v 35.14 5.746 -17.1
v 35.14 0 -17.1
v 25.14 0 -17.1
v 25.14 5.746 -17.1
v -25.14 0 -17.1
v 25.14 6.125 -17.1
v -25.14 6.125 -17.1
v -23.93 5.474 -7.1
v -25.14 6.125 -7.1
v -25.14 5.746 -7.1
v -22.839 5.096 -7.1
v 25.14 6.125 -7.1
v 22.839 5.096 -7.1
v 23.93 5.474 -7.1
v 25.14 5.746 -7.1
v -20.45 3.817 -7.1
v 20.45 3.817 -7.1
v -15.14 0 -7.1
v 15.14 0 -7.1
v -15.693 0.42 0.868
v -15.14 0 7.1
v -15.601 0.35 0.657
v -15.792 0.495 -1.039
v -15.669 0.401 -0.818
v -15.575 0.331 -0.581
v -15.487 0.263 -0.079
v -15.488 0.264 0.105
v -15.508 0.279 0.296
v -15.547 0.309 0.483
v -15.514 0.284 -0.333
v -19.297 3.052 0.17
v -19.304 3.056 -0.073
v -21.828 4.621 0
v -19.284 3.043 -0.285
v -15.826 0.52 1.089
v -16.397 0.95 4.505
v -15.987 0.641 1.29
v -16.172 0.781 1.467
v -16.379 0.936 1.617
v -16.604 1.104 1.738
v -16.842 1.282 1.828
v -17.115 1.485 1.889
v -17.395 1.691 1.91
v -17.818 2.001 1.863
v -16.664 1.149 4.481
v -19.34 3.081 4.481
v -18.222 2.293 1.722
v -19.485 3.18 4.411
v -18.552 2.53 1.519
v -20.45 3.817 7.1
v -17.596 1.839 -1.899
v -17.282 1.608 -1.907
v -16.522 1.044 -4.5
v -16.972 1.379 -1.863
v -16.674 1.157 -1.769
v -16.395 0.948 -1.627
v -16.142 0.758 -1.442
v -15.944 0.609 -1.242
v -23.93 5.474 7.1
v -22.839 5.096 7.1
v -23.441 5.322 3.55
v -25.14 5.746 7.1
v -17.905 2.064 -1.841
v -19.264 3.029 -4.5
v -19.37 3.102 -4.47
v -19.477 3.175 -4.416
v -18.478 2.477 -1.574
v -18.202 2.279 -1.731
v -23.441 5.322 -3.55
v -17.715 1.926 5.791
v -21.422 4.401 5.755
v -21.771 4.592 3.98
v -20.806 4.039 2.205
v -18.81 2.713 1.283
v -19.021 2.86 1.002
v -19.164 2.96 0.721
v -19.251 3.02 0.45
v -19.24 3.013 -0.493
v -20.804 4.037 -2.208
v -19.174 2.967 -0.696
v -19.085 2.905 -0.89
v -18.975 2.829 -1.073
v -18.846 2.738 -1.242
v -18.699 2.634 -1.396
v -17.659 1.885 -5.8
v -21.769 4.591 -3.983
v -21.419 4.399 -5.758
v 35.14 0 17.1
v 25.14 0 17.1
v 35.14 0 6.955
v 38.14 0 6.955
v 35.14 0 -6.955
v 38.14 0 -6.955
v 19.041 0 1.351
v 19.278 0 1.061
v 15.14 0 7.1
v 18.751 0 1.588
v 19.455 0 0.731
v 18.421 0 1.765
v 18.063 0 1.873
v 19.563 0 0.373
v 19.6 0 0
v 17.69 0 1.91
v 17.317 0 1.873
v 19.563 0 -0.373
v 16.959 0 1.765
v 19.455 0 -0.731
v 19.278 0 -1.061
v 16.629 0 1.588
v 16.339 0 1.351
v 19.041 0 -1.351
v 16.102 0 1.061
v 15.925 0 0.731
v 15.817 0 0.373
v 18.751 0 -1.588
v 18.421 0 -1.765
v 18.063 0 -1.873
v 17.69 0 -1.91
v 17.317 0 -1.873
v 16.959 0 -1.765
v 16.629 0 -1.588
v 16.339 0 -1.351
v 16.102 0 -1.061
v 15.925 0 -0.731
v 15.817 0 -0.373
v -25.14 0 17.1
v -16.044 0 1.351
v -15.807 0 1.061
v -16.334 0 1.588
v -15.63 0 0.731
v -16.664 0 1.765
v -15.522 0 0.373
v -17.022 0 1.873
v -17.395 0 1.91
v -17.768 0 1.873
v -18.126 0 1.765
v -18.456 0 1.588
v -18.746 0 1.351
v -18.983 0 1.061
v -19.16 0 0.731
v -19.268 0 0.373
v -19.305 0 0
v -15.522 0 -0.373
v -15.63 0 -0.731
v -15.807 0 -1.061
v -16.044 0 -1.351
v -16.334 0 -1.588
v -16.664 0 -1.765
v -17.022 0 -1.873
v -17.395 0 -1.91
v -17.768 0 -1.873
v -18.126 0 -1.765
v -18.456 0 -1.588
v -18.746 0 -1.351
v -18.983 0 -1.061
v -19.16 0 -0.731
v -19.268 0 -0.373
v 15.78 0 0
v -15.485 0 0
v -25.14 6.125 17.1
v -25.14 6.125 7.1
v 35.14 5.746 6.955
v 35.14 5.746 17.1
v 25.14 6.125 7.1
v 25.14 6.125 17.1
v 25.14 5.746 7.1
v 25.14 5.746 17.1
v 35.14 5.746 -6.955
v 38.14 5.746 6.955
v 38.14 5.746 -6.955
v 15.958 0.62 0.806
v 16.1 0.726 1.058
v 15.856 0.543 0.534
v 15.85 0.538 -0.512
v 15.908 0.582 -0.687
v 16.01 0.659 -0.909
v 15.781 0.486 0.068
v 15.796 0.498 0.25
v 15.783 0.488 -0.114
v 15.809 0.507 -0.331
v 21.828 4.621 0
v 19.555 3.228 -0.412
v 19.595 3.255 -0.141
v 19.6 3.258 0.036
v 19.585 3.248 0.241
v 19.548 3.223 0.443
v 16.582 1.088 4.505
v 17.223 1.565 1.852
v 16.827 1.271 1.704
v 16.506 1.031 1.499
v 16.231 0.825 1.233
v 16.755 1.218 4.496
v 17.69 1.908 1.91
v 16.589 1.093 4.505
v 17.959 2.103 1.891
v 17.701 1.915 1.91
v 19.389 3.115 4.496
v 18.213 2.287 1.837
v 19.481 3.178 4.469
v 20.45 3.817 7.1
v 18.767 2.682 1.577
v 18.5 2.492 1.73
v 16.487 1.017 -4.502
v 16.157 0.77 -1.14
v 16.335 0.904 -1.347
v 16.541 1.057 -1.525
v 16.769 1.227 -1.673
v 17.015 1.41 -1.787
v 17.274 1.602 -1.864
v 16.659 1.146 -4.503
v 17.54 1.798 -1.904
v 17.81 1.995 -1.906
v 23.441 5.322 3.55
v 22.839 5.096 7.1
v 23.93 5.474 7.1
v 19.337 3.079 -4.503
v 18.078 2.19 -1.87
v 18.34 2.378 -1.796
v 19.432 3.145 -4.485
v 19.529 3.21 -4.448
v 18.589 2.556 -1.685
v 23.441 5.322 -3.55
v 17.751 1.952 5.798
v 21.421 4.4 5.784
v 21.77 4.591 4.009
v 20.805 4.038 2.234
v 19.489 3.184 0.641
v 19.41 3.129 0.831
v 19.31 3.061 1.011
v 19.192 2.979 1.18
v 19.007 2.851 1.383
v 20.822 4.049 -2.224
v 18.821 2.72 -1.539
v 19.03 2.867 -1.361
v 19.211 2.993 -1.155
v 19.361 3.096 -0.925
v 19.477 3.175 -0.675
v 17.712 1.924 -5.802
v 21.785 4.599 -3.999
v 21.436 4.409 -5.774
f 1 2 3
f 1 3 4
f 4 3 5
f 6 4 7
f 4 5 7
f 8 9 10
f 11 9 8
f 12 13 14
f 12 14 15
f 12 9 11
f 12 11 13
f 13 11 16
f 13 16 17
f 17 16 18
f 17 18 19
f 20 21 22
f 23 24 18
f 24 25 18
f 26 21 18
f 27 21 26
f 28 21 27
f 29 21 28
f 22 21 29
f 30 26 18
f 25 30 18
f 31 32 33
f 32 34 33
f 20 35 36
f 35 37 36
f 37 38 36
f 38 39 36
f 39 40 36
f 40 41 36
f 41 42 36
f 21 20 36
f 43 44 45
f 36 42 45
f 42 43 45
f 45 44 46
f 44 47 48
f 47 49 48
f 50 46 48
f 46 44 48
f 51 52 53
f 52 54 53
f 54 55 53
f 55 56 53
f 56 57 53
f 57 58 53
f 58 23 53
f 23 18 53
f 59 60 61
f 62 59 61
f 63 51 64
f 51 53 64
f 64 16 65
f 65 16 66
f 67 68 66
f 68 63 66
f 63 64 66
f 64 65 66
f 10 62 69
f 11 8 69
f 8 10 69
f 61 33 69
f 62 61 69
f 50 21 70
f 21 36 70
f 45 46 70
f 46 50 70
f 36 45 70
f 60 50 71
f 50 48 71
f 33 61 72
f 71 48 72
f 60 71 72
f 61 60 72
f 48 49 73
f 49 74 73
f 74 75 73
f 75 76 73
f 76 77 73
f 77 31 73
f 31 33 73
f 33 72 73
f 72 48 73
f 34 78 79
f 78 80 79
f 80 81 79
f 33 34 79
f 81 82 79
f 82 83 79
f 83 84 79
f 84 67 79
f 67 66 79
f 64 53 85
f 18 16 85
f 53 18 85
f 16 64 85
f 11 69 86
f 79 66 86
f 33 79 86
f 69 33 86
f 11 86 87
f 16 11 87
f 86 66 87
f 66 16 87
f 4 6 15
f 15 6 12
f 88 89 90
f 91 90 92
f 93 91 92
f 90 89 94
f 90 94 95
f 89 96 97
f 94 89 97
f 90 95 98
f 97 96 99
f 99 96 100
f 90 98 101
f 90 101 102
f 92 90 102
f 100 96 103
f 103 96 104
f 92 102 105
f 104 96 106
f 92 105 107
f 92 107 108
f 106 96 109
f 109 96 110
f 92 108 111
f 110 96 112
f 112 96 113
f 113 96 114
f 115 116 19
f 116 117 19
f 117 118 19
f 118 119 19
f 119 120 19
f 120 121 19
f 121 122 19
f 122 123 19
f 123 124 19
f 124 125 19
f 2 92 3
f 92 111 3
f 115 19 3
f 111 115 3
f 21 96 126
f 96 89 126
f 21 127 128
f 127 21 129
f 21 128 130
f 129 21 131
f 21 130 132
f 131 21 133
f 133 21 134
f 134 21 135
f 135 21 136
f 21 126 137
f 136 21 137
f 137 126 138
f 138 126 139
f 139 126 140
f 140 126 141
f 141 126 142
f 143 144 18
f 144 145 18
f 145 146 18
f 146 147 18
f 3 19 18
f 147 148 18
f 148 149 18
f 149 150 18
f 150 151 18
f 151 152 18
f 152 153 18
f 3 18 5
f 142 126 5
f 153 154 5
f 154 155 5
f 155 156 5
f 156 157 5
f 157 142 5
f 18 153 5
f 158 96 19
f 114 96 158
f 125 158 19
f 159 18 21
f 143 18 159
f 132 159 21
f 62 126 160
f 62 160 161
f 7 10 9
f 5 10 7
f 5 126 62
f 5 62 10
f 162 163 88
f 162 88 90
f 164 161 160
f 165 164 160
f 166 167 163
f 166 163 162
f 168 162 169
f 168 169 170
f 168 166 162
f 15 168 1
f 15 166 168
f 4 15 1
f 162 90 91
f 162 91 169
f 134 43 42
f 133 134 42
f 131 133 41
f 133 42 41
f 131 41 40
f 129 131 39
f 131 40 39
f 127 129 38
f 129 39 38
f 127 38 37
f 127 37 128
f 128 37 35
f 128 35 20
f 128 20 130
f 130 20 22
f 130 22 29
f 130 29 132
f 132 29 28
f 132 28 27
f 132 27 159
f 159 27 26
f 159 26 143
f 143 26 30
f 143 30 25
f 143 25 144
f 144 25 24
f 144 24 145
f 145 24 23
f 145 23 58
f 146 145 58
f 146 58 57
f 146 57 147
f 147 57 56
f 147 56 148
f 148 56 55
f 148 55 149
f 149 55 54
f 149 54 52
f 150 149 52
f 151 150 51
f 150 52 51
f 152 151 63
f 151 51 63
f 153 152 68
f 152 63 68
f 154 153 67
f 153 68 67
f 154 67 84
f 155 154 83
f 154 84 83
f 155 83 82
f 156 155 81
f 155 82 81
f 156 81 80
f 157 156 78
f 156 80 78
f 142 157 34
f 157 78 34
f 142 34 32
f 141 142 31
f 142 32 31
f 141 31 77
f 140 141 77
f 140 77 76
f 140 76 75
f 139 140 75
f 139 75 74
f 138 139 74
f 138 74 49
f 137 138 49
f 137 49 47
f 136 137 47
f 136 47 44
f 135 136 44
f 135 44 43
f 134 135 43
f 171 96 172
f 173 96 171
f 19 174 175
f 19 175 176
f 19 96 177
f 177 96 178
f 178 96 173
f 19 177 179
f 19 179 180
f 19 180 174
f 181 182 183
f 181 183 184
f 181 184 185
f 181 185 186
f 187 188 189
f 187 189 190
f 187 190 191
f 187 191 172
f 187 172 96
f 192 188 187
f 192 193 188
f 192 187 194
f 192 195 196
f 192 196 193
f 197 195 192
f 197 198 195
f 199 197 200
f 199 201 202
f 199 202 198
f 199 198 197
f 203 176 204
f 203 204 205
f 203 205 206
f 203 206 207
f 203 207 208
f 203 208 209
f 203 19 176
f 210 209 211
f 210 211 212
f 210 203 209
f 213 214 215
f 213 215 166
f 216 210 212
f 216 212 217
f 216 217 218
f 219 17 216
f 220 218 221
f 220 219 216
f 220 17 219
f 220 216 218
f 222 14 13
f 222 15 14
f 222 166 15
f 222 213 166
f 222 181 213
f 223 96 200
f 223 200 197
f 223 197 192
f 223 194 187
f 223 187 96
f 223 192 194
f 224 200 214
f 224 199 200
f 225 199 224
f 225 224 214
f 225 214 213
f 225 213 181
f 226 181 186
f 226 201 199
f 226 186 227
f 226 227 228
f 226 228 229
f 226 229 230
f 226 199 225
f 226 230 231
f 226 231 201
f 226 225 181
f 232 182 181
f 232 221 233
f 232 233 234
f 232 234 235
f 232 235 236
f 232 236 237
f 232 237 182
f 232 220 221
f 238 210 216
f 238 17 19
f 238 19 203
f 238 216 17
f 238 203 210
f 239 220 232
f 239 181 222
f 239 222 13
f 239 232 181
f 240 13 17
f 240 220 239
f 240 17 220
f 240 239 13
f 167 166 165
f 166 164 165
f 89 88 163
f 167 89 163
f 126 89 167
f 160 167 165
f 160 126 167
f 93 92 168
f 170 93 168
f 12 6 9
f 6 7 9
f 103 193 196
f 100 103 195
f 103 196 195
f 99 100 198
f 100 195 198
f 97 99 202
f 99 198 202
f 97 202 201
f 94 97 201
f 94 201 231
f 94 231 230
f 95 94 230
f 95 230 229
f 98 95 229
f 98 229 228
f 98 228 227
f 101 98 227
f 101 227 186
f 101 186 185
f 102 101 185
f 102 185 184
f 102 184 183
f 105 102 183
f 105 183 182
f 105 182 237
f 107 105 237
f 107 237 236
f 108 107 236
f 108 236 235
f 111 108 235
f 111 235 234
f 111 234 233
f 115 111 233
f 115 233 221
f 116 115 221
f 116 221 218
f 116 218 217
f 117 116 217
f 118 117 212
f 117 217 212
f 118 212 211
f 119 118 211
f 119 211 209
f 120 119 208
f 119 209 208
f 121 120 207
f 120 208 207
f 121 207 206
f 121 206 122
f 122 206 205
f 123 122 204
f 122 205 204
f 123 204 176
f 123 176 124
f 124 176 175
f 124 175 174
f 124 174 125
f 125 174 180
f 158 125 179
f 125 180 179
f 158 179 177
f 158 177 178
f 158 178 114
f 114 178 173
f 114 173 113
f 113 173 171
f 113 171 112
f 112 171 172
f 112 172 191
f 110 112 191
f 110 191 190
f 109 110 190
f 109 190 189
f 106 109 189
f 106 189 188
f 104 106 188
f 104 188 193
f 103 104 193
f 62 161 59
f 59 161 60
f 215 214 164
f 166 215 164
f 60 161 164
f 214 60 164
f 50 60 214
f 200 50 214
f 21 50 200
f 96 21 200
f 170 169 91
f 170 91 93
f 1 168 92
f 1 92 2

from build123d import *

# Parameters (mm, degrees)
SKETCH_1_W                = 50.28
SKETCH_1_H                = 34.2
SKETCH_1_W_2              = 30.28
SKETCH_1_H_2              = 14.2
EXTRUDE_1_DEPTH           = 12.25
SKETCH_4_W                = 13
SKETCH_4_H                = 13.91
EXTRUDE_1_2_DEPTH         = 74.82
SKETCH_5_W                = 13.91
SKETCH_5_H                = 16.23
EXTRUDE_2_DEPTH           = 16
SKETCH_7_R                = 25.25
SKETCH_7_R_2              = 15.25
EXTRUDE_2_2_DEPTH         = 16.23
SKETCH_15_R               = 1.91
CUT_EXTRUDE_6_DEPTH       = 97.964478439
SKETCH_16_W               = 13.91
SKETCH_16_H               = 16.23
EXTRUDE_4_DEPTH           = 10
SKETCH_17_R               = 1.91
CUT_EXTRUDE_7_DEPTH       = 102.16913771
SKETCH_18_W               = 49.344544624
SKETCH_18_H               = 6.125
CUT_EXTRUDE_8_DEPTH       = 105.840616652
SKETCH_19_W               = 34.2
SKETCH_19_H               = 6.125
CUT_EXTRUDE_9_DEPTH       = 10
SKETCH_21_R               = 1.91
CUT_EXTRUDE_10_DEPTH      = 10
SKETCH_20_R               = 1.91
CUT_EXTRUDE_11_DEPTH      = 10
FILLET_START              = -7.1
FILLET_1_DEPTH            = 14.2
FILLET_2_DEPTH            = 14.2
SKETCH_29_W               = 13.91
SKETCH_29_H               = 74.82
EXTRUDE_5_DEPTH           = 10
SKETCH_30_W               = 10
SKETCH_30_H               = 58.59
CUT_EXTRUDE_13_DEPTH      = 102.16913771
SKETCH_32_W               = 34.2
SKETCH_32_H               = 5.745736365
EXTRUDE_6_DEPTH           = 10
CUT_EXTRUDE_16_DEPTH      = 50
CUT_EXTRUDE_16_DEPTH_BACK = 50
SKETCH_38_W               = 116.985630298
SKETCH_38_H               = 80.538350638
SKETCH_41_W               = 13.91
SKETCH_41_H               = 5.745736365
EXTRUDE_7_DEPTH           = 3


with BuildPart() as part:
    # 草圖1 → Extrude 1 (new body)
    with BuildSketch(Plane(origin=(0, 0, 0), x_dir=(1, 0, 0), z_dir=(0, 1, 0))):
        Rectangle(SKETCH_1_W, SKETCH_1_H)
        Rectangle(SKETCH_1_W_2, SKETCH_1_H_2, mode=Mode.SUBTRACT)
    extrude(amount=EXTRUDE_1_DEPTH)

    # 草圖4 → Extrude 1 2 (add)
    with BuildSketch(Plane.XZ):
        with Locations((18.64, 0)):
            Rectangle(SKETCH_4_W, SKETCH_4_H)
    extrude(amount=EXTRUDE_1_2_DEPTH)

    # 草圖5 → Extrude 2 (add)
    with BuildSketch(Plane.ZY.offset(-12.14)):
        with Locations((0, -66.705)):
            Rectangle(SKETCH_5_W, SKETCH_5_H)
    extrude(amount=EXTRUDE_2_DEPTH)

    # 草圖7 → Extrude 2 2 (add)
    with BuildSketch(Plane(origin=(3.626674765, -74.82, 0), x_dir=(1, 0, 0), z_dir=(0, -1, 0))):
        with Locations((-30.978154344, 0)):
            Circle(SKETCH_7_R)
        with Locations((-30.978154344, 0)):
            Circle(SKETCH_7_R_2, mode=Mode.SUBTRACT)
    extrude(amount=-EXTRUDE_2_2_DEPTH)

    # 草圖15 → 除料-伸長6 (cut, through all)
    with BuildSketch(Plane(origin=(0, 0, -6.955), x_dir=(-1, 0, 0), z_dir=(0, 0, -1))):
        with Locations((-4.530883248, -66.705)):
            Circle(SKETCH_15_R)
    extrude(amount=-CUT_EXTRUDE_6_DEPTH, mode=Mode.SUBTRACT)

    # 草圖16 → 填料-伸長4 (add)
    with BuildSketch(Plane(origin=(-60, 0, 0), x_dir=(0, 0, -1), z_dir=(1, 0, 0))):
        with Locations((0, -66.705)):
            Rectangle(SKETCH_16_W, SKETCH_16_H)
    extrude(amount=EXTRUDE_4_DEPTH)

    # 草圖17 → 除料-伸長7 (cut, through all)
    with BuildSketch(Plane(origin=(0, 0, -6.955), x_dir=(-1, 0, 0), z_dir=(0, 0, -1))):
        with Locations((55.812362827, -66.705)):
            Circle(SKETCH_17_R)
    extrude(amount=-CUT_EXTRUDE_7_DEPTH, mode=Mode.SUBTRACT)

    # 草圖18 → 除料-伸長8 (cut, through all)
    with BuildSketch(Plane(origin=(0, 0, -17.1), x_dir=(-1, 0, 0), z_dir=(0, 0, -1))):
        with Locations((0.467727688, 9.1875)):
            Rectangle(SKETCH_18_W, SKETCH_18_H)
    extrude(amount=-CUT_EXTRUDE_8_DEPTH, mode=Mode.SUBTRACT)

    # 草圖19 → 除料-伸長9 (cut)
    with BuildSketch(Plane.ZY.offset(-24.204544624)):
        with Locations((0, 9.1875)):
            Rectangle(SKETCH_19_W, SKETCH_19_H)
    extrude(amount=-CUT_EXTRUDE_9_DEPTH, mode=Mode.SUBTRACT)

    # 草圖21 → 除料-伸長10 (cut)
    with BuildSketch(Plane(origin=(0, 6.125, 0), x_dir=(1, 0, 0), z_dir=(0, 1, 0))):
        with Locations(Location((17.69, 0, 0), (0, 0, 270))):
            Circle(SKETCH_21_R)
    extrude(amount=-CUT_EXTRUDE_10_DEPTH, mode=Mode.SUBTRACT)

    # 草圖20 → 除料-伸長11 (cut)
    with BuildSketch(Plane(origin=(0, 6.125, 0), x_dir=(1, 0, 0), z_dir=(0, 1, 0))):
        with Locations(Location((-17.395, 0, 0), (0, 0, 270))):
            Circle(SKETCH_20_R)
    extrude(amount=-CUT_EXTRUDE_11_DEPTH, mode=Mode.SUBTRACT)

    # 圓角1: read off the stored shape, not the designer's step
    # 圓角1 outline → 圓角1 (cut)
    with BuildSketch(Plane.XY.offset(FILLET_START)):
        with BuildLine():
            add(Edge.make_bspline(
                [(-15.14, 0), (-21.974170252, 5.199829476), (-25.14, 5.745736365)],
                knots=[0, 0, 0, 0.664102345, 0.664102345, 0.664102345], degree=2, weights=[1, 2.223777218, 1.822127795]))
            Line((-15.14, 0), (-15.14, 6.125))
            Line((-15.14, 6.125), (-25.14, 6.125))
            Line((-25.14, 6.125), (-25.14, 5.745736365))
        make_face()
    extrude(amount=FILLET_1_DEPTH, mode=Mode.SUBTRACT)

    # 圓角2: read off the stored shape, not the designer's step
    # 圓角2 outline → 圓角2 (cut)
    with BuildSketch(Plane.XY.offset(FILLET_START)):
        with BuildLine():
            Line((15.14, 6.125), (15.14, 0))
            add(Edge.make_bspline(
                [(15.14, 0), (21.974170252, 5.199829476), (25.14, 5.745736365)],
                knots=[0, 0, 0, 0.664102345, 0.664102345, 0.664102345], degree=2, weights=[1, 2.223777218, 1.822127795]))
            Line((25.14, 5.745736365), (25.14, 6.125))
            Line((25.14, 6.125), (15.14, 6.125))
        make_face()
    extrude(amount=FILLET_2_DEPTH, mode=Mode.SUBTRACT)

    # 草圖29 → 填料-伸長5 (add)
    with BuildSketch(Plane(origin=(25.14, 0, 0), x_dir=(0, 0, -1), z_dir=(1, 0, 0))):
        with Locations((0, -37.41)):
            Rectangle(SKETCH_29_W, SKETCH_29_H)
    extrude(amount=EXTRUDE_5_DEPTH)

    # 草圖30 → 除料-伸長13 (cut, through all)
    with BuildSketch(Plane.XY.offset(6.955)):
        with Locations((17.14, -29.295)):
            Rectangle(SKETCH_30_W, SKETCH_30_H)
    extrude(amount=-CUT_EXTRUDE_13_DEPTH, mode=Mode.SUBTRACT)

    # 草圖32 → 填料-伸長6 (add)
    with BuildSketch(Plane(origin=(25.14, 0, 0), x_dir=(0, 0, -1), z_dir=(1, 0, 0))):
        with Locations((0, 2.872868182)):
            Rectangle(SKETCH_32_W, SKETCH_32_H)
    extrude(amount=EXTRUDE_6_DEPTH)

    # 草圖38 → 除料-伸長16 (cut, two sides: drawn at the far end of the back side and taken through both)
    with BuildSketch(Plane(origin=(0, 0, -6.955), x_dir=(-1, 0, 0), z_dir=(0, 0, -1)).offset(-CUT_EXTRUDE_16_DEPTH_BACK)):
        with Locations((7.268869252, -40.269175319)):
            Rectangle(SKETCH_38_W, SKETCH_38_H)
    extrude(amount=CUT_EXTRUDE_16_DEPTH + CUT_EXTRUDE_16_DEPTH_BACK, mode=Mode.SUBTRACT)

    # 草圖41 → 填料-伸長7 (add)
    with BuildSketch(Plane(origin=(35.14, 0, 0), x_dir=(0, 0, -1), z_dir=(1, 0, 0))):
        with Locations((0, 2.872868182)):
            Rectangle(SKETCH_41_W, SKETCH_41_H)
    extrude(amount=EXTRUDE_7_DEPTH)


solid = part.part
